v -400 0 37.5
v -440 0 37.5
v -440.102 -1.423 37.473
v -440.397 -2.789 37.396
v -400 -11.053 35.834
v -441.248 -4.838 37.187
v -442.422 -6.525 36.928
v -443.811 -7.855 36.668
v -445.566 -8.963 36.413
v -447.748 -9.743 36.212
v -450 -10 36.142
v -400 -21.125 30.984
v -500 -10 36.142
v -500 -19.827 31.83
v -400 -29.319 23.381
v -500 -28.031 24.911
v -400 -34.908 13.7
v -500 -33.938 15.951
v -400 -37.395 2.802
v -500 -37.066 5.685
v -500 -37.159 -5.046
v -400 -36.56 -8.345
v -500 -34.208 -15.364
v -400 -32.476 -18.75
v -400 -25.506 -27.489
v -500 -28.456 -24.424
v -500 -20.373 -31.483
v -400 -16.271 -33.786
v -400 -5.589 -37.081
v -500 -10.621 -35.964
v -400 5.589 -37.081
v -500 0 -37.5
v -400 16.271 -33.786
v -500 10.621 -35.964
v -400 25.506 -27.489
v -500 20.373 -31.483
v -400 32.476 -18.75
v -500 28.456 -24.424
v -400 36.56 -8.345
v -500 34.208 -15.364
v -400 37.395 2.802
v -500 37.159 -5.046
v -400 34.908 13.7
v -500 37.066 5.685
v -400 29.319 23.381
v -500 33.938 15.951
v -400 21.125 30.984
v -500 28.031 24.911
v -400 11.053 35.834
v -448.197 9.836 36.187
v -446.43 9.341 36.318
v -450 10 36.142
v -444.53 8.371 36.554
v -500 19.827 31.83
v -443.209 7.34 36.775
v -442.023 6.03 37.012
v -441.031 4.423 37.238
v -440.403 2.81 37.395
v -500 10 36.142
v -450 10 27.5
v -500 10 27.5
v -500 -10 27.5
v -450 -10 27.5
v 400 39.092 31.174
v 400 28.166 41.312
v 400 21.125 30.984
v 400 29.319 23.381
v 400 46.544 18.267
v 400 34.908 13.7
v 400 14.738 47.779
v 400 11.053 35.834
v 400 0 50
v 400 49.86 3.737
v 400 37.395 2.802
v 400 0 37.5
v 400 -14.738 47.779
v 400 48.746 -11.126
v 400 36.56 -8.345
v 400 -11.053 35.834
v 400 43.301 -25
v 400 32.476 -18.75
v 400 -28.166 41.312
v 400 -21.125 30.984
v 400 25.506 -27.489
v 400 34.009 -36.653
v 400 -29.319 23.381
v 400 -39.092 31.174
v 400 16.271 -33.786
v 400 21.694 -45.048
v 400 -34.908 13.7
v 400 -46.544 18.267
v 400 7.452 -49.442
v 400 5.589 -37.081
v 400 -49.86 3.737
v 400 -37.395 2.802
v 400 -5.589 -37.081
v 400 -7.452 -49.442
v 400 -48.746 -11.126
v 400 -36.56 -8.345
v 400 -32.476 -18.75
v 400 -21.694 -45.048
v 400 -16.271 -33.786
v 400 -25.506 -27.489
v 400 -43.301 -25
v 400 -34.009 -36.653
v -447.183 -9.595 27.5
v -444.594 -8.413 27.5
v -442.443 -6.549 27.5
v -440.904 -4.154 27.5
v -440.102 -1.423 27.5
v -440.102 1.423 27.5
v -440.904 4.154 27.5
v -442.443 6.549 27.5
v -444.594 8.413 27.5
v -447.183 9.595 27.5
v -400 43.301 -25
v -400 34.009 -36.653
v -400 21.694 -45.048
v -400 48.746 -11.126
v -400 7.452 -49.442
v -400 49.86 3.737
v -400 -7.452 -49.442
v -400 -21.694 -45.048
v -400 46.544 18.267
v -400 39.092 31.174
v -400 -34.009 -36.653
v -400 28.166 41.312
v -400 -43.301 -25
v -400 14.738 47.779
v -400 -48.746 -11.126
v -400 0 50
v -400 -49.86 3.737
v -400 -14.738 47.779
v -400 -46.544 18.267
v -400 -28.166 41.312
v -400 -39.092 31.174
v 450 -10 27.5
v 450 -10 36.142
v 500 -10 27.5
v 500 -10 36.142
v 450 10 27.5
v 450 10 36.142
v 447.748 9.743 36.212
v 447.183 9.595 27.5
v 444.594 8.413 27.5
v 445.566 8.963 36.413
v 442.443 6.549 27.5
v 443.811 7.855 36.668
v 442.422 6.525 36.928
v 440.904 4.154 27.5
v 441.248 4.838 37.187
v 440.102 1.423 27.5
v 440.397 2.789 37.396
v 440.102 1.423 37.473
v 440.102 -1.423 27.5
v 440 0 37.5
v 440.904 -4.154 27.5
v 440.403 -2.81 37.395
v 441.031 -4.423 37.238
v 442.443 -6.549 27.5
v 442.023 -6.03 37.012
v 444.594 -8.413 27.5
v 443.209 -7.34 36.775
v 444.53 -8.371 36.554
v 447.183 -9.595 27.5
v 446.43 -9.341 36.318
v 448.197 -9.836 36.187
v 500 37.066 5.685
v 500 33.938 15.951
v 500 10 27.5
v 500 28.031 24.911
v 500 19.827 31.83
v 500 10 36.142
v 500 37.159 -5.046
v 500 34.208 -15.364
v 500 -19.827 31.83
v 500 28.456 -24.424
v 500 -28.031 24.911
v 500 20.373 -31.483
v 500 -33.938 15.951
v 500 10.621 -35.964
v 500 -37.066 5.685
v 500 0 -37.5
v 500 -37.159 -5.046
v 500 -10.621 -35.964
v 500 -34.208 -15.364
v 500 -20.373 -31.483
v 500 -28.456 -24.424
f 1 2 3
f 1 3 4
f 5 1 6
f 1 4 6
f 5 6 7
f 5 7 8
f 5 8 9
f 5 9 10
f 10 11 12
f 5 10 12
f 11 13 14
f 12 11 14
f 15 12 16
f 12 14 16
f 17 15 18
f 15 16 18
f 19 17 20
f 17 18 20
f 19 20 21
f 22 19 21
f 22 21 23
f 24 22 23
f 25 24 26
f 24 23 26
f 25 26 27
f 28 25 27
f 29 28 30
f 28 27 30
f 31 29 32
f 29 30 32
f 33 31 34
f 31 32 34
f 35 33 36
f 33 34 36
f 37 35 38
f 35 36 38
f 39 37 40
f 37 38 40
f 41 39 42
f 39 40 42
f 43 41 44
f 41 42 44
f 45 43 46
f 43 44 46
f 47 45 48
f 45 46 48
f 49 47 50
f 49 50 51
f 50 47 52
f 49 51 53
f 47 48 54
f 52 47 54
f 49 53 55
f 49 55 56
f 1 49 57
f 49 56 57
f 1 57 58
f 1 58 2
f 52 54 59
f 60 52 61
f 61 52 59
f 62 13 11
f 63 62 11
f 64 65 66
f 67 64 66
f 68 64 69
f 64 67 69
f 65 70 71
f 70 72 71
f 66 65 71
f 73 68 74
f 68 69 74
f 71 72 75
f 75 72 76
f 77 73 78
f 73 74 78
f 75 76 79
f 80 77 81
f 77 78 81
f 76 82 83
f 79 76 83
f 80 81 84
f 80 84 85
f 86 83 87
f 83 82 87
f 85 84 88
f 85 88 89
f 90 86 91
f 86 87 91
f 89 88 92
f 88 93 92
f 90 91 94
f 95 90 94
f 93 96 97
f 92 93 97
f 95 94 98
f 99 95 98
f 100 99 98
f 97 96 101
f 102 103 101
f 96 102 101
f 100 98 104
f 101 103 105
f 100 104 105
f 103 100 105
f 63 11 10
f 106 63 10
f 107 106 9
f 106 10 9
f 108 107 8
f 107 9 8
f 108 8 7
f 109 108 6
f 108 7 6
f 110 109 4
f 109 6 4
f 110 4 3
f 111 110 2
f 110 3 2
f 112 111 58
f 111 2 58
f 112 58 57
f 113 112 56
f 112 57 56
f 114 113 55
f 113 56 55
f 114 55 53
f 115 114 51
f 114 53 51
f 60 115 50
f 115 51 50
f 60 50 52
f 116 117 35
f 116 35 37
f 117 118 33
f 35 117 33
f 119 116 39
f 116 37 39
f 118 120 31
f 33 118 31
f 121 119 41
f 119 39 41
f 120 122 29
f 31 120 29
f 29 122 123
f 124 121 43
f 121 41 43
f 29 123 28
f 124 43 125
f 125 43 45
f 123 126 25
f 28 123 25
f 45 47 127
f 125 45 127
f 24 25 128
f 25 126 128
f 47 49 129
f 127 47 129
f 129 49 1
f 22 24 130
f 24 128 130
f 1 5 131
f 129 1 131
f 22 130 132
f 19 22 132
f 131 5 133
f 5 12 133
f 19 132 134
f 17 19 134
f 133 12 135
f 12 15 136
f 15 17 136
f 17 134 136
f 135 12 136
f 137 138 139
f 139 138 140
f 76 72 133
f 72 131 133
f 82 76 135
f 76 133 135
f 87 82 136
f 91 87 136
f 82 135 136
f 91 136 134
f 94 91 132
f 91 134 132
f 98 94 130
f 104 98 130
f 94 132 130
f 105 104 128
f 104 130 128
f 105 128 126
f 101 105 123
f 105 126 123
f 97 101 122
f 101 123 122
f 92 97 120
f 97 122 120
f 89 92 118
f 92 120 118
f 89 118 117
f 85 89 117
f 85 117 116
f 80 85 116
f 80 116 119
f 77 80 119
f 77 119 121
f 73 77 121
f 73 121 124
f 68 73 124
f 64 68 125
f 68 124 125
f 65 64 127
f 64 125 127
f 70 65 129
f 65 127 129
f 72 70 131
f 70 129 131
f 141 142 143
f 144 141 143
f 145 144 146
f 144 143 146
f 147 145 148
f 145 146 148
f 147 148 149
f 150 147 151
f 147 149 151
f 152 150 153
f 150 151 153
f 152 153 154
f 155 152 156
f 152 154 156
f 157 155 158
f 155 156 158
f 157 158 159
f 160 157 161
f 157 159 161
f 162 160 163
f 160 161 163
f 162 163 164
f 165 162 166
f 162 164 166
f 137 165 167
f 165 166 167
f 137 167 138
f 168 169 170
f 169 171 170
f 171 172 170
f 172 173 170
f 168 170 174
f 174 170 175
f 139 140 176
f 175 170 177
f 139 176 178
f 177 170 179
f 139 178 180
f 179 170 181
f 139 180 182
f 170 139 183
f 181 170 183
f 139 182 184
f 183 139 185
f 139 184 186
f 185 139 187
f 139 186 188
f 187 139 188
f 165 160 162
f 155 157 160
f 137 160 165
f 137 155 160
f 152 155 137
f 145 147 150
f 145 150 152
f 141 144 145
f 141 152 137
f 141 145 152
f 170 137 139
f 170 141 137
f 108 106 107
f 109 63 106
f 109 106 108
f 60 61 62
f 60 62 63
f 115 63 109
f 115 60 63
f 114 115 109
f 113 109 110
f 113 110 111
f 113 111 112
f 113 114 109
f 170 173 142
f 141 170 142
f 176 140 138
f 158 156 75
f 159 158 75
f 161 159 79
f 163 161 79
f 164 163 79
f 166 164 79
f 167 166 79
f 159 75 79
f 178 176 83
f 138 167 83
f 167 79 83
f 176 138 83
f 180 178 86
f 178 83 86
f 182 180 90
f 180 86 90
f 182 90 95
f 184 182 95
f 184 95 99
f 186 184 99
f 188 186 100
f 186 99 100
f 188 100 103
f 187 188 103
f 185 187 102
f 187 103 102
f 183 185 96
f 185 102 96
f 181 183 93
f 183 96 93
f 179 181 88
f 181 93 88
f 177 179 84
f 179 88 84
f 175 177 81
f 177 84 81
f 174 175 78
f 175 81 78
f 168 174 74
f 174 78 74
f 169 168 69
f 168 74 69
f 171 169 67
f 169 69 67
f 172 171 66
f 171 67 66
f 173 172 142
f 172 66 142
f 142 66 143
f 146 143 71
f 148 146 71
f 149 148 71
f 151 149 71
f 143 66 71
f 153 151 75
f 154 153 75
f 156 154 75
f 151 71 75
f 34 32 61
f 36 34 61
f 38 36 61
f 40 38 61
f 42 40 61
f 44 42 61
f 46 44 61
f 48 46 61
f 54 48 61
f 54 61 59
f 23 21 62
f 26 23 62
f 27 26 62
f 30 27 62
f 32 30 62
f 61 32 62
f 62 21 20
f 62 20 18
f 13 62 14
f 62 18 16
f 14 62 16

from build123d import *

# Parameters (mm, degrees)
F4_DEPTH = 10


with BuildPart() as f1:
    # F0 (on Front) → F1 (revolve)
    with BuildSketch(Plane.XZ):
        Polygon((-500, 37.5), (-500, 0), (500, 0), (500, 37.5), (400, 37.5), (400, 50), (-400, 50), (-400, 37.5), align=None)
    revolve(axis=Axis((0, 0, 0), (1, 0, 0)))

    # F3 (on offset) → F4 (cut)
    with BuildSketch(Plane.XY.offset(37.5)):
        with BuildLine():
            Line((-450, 10), (-500, 10))
            Line((-500, 10), (-500, -10))
            Line((-500, -10), (-450, -10))
            ThreePointArc((-450, -10), (-440, 0), (-450, 10))
        make_face()
        with BuildLine():
            ThreePointArc((450, 10), (440, 0), (450, -10))
            Line((450, -10), (500, -10))
            Line((500, -10), (500, 10))
            Line((500, 10), (450, 10))
        make_face()
    extrude(amount=-F4_DEPTH, mode=Mode.SUBTRACT)


solid = f1.part
